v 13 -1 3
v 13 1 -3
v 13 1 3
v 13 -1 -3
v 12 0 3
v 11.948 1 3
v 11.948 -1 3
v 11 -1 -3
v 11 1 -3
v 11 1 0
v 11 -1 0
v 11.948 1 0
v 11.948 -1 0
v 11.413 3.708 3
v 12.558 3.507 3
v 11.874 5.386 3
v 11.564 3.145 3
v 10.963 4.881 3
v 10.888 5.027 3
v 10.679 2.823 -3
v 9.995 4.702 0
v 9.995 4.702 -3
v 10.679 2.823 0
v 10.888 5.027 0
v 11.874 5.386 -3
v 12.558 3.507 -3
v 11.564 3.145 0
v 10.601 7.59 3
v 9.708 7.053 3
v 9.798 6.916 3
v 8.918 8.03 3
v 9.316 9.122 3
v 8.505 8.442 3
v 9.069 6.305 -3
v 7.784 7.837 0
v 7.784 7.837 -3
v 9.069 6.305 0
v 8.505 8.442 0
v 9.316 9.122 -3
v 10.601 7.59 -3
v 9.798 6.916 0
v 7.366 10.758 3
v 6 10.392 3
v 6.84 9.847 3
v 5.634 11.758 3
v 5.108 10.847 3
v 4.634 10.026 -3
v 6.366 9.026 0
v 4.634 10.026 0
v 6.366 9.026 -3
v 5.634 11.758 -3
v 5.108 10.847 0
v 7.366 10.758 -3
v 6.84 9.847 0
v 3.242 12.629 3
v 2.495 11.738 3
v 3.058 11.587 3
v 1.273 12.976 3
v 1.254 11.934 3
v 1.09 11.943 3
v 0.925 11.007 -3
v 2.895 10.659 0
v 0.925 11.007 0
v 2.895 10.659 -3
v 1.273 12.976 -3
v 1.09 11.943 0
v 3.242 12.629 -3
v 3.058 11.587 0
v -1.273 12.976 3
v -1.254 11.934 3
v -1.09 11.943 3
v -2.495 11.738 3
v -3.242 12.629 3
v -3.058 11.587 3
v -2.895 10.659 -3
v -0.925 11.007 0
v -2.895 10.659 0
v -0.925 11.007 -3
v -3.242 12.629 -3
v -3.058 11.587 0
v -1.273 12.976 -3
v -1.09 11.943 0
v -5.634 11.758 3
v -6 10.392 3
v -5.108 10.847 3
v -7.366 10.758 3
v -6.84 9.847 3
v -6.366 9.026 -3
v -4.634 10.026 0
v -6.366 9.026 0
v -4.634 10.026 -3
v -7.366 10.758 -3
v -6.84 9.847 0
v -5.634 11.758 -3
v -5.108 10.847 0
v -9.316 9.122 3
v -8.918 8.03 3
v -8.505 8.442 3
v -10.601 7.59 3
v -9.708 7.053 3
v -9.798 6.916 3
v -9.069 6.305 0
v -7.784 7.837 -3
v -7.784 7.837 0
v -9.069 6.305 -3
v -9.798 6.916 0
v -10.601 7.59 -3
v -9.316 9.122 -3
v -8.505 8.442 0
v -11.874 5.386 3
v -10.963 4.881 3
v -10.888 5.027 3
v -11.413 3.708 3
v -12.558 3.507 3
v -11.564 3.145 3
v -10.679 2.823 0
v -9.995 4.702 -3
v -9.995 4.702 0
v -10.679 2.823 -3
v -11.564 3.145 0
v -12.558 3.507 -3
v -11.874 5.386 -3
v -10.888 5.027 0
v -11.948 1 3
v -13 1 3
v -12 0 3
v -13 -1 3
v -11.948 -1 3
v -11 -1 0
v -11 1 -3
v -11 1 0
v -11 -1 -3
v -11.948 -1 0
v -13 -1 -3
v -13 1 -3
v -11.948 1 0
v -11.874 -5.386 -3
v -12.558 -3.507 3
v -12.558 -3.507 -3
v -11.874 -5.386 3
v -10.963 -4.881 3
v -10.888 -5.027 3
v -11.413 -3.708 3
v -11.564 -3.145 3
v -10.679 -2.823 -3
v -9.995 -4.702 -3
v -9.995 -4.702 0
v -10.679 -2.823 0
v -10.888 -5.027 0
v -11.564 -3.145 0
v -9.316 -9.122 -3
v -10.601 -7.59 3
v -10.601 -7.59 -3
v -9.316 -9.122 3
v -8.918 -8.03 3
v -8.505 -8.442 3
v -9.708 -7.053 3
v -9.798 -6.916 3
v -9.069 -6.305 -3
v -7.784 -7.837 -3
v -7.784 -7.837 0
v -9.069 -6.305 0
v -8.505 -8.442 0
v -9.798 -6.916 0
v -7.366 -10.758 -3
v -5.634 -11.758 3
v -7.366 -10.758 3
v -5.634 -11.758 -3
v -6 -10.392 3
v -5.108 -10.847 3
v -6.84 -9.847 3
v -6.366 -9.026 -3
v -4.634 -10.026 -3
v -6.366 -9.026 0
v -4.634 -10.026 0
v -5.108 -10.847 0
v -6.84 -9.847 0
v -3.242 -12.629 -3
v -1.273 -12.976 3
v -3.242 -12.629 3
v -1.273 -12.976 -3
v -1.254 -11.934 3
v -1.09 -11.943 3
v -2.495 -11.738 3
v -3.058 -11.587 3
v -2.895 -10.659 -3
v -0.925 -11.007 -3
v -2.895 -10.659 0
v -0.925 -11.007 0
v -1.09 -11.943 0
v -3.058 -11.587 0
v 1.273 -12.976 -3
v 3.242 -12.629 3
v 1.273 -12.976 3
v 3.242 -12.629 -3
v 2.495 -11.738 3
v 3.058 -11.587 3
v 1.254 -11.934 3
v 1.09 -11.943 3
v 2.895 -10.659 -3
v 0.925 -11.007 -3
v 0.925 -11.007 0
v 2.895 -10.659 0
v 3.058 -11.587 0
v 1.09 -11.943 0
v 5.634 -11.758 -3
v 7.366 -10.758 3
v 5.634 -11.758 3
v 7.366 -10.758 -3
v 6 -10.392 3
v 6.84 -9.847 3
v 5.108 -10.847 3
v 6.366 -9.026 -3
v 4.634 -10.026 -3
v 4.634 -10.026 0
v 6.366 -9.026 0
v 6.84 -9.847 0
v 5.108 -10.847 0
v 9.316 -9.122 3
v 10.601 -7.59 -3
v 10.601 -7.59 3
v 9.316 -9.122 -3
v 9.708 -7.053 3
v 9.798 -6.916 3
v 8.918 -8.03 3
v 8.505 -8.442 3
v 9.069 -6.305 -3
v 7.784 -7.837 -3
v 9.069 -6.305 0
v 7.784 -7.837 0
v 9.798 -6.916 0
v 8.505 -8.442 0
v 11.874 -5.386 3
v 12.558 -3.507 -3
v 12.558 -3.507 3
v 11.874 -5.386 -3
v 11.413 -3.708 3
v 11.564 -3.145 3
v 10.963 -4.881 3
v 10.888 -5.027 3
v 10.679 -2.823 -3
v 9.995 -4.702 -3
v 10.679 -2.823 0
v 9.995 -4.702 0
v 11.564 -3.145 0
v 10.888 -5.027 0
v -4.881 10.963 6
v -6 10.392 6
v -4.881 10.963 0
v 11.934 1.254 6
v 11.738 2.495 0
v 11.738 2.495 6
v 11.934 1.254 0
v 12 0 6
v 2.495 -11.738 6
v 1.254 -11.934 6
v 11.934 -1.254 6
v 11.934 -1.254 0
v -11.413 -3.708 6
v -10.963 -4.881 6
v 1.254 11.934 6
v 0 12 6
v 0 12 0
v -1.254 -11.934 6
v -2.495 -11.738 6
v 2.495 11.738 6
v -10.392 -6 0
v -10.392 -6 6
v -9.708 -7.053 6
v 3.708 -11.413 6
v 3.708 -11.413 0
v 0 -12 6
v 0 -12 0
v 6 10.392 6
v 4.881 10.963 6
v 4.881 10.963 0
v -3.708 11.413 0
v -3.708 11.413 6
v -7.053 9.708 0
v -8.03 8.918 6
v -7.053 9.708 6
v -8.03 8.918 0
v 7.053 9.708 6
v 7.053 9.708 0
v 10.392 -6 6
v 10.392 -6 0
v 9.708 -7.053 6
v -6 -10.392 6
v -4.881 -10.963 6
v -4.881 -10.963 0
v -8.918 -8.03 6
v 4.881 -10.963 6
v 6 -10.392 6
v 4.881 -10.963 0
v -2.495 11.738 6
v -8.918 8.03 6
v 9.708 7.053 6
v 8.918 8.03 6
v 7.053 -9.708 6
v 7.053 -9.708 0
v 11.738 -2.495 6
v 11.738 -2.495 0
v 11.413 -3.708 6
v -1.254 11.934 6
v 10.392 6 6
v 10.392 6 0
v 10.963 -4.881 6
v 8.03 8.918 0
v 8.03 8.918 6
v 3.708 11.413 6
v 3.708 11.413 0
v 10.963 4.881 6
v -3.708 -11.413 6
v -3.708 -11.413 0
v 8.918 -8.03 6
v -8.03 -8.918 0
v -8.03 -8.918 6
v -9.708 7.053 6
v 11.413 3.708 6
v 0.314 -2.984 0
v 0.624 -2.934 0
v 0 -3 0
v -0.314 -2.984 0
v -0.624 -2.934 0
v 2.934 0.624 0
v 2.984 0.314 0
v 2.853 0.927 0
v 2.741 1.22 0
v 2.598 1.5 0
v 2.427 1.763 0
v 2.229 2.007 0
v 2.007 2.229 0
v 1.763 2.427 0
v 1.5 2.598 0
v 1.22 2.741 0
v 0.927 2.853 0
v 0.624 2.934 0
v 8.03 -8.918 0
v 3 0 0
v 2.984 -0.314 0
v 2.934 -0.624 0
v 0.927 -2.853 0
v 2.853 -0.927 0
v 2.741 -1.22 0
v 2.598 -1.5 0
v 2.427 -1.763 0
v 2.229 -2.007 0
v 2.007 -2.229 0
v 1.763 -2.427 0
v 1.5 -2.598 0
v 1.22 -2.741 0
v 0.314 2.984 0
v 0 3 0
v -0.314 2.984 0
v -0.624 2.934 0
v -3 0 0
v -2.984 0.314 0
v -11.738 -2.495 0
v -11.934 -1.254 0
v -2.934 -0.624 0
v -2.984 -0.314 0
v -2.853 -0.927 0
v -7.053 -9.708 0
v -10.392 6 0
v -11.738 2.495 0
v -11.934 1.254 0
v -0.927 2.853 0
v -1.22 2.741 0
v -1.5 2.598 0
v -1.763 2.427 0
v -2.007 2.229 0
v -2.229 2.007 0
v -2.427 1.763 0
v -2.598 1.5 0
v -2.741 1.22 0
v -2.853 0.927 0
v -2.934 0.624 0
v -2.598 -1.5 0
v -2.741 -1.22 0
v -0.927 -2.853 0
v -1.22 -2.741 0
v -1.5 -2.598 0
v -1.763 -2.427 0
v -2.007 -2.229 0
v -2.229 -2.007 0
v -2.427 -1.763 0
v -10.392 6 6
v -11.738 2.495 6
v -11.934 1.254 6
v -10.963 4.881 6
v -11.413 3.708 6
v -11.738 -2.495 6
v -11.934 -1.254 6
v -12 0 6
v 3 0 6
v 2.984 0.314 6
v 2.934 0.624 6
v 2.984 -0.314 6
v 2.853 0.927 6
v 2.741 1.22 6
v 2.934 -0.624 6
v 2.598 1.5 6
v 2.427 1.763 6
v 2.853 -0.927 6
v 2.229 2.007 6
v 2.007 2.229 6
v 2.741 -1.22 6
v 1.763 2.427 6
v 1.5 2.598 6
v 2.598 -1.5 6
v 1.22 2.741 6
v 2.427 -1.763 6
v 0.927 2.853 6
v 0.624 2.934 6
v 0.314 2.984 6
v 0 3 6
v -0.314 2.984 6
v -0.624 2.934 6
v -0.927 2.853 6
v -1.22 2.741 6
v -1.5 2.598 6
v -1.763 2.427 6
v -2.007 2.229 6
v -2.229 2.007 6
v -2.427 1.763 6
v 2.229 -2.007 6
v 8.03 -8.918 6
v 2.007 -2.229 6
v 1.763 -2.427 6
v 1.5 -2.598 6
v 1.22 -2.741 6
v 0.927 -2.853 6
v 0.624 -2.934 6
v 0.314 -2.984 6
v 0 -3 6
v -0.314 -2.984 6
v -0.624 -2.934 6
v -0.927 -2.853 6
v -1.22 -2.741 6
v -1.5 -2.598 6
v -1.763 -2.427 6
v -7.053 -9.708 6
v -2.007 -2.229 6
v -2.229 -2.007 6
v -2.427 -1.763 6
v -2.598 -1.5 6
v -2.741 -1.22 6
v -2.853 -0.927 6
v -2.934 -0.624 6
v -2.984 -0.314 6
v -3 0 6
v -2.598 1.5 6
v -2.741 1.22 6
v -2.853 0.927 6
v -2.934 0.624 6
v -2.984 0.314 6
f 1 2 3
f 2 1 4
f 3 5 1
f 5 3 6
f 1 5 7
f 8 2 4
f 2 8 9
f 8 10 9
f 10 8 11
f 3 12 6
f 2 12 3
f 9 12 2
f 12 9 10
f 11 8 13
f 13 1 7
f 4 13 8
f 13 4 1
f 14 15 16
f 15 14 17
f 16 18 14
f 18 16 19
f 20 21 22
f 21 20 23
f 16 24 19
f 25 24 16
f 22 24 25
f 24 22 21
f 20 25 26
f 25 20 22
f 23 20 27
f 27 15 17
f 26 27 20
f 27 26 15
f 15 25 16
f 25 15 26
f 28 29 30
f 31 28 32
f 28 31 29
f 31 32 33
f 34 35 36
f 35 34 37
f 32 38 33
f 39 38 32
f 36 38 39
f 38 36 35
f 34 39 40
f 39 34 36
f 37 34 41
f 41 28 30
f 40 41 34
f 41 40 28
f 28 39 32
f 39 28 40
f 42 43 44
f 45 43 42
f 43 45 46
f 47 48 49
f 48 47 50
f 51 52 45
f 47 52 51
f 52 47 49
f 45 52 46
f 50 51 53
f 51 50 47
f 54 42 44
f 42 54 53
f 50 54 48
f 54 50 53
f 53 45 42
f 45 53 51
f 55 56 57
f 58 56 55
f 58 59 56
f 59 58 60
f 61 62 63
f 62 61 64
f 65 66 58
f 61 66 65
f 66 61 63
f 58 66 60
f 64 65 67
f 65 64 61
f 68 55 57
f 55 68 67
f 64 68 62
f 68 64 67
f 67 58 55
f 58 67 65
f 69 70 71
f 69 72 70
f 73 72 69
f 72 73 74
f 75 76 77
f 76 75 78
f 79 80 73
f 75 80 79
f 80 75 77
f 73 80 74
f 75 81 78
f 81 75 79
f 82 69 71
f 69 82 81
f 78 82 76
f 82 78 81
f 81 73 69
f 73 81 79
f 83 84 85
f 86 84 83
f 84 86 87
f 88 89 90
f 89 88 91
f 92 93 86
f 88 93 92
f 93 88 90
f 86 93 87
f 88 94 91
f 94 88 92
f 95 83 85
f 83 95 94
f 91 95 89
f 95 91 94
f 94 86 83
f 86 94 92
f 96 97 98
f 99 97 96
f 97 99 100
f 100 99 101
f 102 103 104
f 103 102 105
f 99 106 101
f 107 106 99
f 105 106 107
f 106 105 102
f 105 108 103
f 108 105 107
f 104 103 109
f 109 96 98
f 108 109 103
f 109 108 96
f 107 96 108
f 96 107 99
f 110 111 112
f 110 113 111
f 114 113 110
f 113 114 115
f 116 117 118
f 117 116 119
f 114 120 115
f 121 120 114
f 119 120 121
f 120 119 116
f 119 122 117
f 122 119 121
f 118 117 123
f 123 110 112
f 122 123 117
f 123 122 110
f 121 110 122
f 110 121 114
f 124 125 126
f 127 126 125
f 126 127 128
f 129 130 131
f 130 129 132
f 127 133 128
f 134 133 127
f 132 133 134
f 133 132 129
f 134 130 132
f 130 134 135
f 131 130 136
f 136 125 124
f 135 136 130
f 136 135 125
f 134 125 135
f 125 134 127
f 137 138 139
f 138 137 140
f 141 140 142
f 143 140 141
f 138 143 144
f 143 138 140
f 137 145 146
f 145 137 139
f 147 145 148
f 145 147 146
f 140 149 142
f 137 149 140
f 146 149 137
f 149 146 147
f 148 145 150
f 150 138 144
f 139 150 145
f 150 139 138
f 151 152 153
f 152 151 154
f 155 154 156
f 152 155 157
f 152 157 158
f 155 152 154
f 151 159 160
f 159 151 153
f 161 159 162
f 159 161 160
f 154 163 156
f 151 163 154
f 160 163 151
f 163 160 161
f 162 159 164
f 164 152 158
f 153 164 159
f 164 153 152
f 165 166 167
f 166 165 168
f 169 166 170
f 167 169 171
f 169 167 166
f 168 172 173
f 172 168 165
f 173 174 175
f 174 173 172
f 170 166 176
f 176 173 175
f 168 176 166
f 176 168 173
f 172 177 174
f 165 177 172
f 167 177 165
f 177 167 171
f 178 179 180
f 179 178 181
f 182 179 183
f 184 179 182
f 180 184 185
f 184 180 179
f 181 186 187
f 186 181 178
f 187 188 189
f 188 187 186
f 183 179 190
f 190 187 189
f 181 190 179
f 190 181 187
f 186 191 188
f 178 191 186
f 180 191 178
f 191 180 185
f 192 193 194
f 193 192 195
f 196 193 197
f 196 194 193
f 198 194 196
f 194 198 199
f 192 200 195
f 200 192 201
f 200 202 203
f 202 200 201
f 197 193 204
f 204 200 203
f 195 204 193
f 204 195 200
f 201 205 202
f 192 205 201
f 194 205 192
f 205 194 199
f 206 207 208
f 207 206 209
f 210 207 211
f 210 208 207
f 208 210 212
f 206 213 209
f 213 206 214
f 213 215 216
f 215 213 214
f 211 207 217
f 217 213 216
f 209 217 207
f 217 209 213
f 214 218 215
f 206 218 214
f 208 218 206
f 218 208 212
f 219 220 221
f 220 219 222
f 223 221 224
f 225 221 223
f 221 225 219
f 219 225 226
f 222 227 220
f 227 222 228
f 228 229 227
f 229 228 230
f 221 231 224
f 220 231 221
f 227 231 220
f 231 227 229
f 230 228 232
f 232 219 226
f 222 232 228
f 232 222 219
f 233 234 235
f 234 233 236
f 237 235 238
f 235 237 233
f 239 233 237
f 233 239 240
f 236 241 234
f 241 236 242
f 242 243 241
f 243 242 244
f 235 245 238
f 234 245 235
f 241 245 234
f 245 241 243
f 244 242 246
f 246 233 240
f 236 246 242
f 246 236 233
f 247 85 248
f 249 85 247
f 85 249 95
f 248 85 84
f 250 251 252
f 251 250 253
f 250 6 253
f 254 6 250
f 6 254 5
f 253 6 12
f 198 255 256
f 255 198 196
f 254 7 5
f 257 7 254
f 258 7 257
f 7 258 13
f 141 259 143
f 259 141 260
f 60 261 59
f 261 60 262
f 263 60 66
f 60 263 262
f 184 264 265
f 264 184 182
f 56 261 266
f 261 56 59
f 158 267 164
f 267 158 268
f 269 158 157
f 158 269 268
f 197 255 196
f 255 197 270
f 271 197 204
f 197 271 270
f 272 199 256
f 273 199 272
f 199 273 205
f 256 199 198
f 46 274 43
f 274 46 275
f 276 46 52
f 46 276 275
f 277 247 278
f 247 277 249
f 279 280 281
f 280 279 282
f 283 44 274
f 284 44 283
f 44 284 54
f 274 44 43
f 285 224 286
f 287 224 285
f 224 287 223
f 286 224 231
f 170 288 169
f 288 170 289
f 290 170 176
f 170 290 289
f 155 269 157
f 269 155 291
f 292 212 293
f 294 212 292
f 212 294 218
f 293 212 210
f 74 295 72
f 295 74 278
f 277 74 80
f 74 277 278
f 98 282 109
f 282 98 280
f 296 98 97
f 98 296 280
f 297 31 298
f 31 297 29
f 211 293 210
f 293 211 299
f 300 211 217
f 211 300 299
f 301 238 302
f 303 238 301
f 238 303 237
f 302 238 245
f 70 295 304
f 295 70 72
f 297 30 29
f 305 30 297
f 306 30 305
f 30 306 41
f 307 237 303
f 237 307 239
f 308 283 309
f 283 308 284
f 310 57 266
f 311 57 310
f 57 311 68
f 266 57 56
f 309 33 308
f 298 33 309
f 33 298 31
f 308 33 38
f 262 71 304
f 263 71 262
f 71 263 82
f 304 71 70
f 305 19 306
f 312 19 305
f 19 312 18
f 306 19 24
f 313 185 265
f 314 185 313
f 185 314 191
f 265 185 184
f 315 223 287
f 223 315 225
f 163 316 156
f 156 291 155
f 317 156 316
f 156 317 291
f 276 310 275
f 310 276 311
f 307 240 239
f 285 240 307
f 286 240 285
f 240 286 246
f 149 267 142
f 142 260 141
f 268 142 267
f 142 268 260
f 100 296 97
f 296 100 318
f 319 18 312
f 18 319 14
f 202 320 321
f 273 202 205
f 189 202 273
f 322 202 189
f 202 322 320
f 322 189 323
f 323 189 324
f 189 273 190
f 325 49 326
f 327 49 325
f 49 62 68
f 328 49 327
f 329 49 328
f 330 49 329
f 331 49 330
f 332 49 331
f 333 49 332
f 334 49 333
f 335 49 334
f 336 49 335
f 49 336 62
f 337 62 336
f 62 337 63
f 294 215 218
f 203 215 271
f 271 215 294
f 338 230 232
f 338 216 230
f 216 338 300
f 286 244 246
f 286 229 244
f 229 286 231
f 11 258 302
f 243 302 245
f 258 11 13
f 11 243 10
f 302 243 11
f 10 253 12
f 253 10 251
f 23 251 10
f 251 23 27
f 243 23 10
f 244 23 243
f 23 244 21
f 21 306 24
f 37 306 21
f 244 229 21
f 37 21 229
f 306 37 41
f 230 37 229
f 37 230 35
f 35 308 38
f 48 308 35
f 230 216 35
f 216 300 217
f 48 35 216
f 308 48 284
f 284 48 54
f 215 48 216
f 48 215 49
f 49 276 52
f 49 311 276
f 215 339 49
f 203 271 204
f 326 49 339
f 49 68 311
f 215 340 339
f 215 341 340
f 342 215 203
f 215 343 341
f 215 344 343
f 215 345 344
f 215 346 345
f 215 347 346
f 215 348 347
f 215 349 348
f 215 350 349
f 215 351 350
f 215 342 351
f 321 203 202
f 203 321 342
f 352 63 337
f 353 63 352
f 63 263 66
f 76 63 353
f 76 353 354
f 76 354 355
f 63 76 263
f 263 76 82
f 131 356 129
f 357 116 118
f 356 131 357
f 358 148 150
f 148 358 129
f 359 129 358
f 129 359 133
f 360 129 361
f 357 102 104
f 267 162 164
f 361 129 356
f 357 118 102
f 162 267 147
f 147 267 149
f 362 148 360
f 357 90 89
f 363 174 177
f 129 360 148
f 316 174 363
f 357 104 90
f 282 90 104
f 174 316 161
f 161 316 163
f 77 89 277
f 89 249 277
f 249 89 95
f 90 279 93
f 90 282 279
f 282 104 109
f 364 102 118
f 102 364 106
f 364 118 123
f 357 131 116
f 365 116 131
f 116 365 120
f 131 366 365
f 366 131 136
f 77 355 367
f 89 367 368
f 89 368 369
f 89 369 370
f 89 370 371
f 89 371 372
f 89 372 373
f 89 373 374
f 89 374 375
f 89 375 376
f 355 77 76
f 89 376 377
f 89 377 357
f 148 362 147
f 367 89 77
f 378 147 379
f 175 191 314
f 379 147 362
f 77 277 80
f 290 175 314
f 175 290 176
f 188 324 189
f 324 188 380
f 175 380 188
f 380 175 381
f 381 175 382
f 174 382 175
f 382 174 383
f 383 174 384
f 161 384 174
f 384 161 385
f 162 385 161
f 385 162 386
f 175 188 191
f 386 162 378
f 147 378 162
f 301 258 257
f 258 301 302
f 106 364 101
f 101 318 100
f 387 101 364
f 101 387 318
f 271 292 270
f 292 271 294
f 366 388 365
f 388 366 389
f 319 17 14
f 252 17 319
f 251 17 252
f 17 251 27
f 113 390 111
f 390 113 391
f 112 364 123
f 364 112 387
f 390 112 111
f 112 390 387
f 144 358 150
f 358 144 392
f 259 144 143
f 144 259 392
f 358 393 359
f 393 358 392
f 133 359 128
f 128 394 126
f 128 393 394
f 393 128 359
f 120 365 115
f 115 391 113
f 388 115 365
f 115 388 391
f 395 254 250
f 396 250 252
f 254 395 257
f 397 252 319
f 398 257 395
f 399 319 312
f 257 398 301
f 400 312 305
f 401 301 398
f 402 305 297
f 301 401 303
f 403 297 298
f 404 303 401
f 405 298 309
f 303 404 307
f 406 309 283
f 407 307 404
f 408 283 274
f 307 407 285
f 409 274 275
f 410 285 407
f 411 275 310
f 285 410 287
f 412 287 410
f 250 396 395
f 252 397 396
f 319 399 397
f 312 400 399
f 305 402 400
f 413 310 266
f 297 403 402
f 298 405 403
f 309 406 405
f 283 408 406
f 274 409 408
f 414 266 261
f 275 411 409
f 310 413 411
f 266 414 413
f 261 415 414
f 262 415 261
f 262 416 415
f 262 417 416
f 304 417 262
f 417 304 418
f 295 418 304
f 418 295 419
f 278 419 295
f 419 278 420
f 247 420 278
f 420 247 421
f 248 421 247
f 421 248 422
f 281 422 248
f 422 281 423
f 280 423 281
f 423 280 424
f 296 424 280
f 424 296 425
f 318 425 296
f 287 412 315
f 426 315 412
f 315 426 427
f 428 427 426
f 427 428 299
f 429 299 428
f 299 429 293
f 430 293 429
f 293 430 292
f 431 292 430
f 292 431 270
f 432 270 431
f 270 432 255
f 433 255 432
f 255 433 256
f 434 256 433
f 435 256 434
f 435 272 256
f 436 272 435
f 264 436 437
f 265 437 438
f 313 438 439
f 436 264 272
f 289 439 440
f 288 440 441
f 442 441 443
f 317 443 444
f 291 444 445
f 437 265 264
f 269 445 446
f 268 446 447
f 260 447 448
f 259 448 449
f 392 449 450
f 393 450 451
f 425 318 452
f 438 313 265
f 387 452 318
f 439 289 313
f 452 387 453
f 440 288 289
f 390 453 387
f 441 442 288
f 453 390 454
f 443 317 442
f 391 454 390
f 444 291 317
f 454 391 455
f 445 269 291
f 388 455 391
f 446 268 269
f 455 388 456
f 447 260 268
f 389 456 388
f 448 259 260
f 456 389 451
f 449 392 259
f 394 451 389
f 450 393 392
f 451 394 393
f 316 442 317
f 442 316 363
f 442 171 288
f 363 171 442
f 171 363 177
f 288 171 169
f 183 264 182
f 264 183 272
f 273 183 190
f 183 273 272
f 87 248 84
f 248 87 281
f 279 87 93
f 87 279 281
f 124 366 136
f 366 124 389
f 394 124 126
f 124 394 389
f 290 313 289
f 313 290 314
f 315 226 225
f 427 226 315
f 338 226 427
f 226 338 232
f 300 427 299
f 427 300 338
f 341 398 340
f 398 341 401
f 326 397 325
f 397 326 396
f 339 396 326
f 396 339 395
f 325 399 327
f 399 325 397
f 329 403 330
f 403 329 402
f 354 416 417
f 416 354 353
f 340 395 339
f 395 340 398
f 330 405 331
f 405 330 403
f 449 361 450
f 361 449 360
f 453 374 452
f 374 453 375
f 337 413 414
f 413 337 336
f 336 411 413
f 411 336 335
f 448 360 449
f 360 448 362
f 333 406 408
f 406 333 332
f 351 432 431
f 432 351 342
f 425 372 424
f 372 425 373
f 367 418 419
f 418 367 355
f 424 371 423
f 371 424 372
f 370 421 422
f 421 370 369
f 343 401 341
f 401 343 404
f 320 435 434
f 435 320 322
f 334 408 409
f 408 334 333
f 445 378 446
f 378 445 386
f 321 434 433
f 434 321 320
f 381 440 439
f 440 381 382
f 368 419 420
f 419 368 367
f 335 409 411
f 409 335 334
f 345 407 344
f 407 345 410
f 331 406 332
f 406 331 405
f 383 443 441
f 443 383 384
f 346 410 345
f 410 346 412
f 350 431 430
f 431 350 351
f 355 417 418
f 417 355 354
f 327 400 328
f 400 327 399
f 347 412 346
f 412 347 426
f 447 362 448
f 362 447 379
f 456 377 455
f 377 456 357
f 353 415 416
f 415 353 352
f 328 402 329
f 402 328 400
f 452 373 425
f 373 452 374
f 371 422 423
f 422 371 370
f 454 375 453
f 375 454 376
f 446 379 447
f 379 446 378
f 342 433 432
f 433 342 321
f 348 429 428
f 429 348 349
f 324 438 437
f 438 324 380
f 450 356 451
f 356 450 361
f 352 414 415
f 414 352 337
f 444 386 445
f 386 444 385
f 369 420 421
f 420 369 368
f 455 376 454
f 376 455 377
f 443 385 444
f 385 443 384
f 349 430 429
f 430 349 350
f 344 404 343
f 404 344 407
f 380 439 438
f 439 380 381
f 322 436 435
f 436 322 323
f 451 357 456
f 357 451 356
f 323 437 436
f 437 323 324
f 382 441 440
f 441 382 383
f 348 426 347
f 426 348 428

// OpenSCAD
// Gear blank with external locator teeth.
$fn = 60;
eps = 0.02;
bore_d = 6;
root_d = 24;
teeth = 18;
thickness = 6;
difference() { union() { cylinder(d=root_d,h=thickness); for(i=[0:teeth-1]) rotate([0,0,i*360/teeth]) translate([root_d/2,0,0]) cube([2,max(2,root_d*0.08),thickness],center=true); } translate([0,0,-eps]) cylinder(d=bore_d,h=thickness+2*eps); }
